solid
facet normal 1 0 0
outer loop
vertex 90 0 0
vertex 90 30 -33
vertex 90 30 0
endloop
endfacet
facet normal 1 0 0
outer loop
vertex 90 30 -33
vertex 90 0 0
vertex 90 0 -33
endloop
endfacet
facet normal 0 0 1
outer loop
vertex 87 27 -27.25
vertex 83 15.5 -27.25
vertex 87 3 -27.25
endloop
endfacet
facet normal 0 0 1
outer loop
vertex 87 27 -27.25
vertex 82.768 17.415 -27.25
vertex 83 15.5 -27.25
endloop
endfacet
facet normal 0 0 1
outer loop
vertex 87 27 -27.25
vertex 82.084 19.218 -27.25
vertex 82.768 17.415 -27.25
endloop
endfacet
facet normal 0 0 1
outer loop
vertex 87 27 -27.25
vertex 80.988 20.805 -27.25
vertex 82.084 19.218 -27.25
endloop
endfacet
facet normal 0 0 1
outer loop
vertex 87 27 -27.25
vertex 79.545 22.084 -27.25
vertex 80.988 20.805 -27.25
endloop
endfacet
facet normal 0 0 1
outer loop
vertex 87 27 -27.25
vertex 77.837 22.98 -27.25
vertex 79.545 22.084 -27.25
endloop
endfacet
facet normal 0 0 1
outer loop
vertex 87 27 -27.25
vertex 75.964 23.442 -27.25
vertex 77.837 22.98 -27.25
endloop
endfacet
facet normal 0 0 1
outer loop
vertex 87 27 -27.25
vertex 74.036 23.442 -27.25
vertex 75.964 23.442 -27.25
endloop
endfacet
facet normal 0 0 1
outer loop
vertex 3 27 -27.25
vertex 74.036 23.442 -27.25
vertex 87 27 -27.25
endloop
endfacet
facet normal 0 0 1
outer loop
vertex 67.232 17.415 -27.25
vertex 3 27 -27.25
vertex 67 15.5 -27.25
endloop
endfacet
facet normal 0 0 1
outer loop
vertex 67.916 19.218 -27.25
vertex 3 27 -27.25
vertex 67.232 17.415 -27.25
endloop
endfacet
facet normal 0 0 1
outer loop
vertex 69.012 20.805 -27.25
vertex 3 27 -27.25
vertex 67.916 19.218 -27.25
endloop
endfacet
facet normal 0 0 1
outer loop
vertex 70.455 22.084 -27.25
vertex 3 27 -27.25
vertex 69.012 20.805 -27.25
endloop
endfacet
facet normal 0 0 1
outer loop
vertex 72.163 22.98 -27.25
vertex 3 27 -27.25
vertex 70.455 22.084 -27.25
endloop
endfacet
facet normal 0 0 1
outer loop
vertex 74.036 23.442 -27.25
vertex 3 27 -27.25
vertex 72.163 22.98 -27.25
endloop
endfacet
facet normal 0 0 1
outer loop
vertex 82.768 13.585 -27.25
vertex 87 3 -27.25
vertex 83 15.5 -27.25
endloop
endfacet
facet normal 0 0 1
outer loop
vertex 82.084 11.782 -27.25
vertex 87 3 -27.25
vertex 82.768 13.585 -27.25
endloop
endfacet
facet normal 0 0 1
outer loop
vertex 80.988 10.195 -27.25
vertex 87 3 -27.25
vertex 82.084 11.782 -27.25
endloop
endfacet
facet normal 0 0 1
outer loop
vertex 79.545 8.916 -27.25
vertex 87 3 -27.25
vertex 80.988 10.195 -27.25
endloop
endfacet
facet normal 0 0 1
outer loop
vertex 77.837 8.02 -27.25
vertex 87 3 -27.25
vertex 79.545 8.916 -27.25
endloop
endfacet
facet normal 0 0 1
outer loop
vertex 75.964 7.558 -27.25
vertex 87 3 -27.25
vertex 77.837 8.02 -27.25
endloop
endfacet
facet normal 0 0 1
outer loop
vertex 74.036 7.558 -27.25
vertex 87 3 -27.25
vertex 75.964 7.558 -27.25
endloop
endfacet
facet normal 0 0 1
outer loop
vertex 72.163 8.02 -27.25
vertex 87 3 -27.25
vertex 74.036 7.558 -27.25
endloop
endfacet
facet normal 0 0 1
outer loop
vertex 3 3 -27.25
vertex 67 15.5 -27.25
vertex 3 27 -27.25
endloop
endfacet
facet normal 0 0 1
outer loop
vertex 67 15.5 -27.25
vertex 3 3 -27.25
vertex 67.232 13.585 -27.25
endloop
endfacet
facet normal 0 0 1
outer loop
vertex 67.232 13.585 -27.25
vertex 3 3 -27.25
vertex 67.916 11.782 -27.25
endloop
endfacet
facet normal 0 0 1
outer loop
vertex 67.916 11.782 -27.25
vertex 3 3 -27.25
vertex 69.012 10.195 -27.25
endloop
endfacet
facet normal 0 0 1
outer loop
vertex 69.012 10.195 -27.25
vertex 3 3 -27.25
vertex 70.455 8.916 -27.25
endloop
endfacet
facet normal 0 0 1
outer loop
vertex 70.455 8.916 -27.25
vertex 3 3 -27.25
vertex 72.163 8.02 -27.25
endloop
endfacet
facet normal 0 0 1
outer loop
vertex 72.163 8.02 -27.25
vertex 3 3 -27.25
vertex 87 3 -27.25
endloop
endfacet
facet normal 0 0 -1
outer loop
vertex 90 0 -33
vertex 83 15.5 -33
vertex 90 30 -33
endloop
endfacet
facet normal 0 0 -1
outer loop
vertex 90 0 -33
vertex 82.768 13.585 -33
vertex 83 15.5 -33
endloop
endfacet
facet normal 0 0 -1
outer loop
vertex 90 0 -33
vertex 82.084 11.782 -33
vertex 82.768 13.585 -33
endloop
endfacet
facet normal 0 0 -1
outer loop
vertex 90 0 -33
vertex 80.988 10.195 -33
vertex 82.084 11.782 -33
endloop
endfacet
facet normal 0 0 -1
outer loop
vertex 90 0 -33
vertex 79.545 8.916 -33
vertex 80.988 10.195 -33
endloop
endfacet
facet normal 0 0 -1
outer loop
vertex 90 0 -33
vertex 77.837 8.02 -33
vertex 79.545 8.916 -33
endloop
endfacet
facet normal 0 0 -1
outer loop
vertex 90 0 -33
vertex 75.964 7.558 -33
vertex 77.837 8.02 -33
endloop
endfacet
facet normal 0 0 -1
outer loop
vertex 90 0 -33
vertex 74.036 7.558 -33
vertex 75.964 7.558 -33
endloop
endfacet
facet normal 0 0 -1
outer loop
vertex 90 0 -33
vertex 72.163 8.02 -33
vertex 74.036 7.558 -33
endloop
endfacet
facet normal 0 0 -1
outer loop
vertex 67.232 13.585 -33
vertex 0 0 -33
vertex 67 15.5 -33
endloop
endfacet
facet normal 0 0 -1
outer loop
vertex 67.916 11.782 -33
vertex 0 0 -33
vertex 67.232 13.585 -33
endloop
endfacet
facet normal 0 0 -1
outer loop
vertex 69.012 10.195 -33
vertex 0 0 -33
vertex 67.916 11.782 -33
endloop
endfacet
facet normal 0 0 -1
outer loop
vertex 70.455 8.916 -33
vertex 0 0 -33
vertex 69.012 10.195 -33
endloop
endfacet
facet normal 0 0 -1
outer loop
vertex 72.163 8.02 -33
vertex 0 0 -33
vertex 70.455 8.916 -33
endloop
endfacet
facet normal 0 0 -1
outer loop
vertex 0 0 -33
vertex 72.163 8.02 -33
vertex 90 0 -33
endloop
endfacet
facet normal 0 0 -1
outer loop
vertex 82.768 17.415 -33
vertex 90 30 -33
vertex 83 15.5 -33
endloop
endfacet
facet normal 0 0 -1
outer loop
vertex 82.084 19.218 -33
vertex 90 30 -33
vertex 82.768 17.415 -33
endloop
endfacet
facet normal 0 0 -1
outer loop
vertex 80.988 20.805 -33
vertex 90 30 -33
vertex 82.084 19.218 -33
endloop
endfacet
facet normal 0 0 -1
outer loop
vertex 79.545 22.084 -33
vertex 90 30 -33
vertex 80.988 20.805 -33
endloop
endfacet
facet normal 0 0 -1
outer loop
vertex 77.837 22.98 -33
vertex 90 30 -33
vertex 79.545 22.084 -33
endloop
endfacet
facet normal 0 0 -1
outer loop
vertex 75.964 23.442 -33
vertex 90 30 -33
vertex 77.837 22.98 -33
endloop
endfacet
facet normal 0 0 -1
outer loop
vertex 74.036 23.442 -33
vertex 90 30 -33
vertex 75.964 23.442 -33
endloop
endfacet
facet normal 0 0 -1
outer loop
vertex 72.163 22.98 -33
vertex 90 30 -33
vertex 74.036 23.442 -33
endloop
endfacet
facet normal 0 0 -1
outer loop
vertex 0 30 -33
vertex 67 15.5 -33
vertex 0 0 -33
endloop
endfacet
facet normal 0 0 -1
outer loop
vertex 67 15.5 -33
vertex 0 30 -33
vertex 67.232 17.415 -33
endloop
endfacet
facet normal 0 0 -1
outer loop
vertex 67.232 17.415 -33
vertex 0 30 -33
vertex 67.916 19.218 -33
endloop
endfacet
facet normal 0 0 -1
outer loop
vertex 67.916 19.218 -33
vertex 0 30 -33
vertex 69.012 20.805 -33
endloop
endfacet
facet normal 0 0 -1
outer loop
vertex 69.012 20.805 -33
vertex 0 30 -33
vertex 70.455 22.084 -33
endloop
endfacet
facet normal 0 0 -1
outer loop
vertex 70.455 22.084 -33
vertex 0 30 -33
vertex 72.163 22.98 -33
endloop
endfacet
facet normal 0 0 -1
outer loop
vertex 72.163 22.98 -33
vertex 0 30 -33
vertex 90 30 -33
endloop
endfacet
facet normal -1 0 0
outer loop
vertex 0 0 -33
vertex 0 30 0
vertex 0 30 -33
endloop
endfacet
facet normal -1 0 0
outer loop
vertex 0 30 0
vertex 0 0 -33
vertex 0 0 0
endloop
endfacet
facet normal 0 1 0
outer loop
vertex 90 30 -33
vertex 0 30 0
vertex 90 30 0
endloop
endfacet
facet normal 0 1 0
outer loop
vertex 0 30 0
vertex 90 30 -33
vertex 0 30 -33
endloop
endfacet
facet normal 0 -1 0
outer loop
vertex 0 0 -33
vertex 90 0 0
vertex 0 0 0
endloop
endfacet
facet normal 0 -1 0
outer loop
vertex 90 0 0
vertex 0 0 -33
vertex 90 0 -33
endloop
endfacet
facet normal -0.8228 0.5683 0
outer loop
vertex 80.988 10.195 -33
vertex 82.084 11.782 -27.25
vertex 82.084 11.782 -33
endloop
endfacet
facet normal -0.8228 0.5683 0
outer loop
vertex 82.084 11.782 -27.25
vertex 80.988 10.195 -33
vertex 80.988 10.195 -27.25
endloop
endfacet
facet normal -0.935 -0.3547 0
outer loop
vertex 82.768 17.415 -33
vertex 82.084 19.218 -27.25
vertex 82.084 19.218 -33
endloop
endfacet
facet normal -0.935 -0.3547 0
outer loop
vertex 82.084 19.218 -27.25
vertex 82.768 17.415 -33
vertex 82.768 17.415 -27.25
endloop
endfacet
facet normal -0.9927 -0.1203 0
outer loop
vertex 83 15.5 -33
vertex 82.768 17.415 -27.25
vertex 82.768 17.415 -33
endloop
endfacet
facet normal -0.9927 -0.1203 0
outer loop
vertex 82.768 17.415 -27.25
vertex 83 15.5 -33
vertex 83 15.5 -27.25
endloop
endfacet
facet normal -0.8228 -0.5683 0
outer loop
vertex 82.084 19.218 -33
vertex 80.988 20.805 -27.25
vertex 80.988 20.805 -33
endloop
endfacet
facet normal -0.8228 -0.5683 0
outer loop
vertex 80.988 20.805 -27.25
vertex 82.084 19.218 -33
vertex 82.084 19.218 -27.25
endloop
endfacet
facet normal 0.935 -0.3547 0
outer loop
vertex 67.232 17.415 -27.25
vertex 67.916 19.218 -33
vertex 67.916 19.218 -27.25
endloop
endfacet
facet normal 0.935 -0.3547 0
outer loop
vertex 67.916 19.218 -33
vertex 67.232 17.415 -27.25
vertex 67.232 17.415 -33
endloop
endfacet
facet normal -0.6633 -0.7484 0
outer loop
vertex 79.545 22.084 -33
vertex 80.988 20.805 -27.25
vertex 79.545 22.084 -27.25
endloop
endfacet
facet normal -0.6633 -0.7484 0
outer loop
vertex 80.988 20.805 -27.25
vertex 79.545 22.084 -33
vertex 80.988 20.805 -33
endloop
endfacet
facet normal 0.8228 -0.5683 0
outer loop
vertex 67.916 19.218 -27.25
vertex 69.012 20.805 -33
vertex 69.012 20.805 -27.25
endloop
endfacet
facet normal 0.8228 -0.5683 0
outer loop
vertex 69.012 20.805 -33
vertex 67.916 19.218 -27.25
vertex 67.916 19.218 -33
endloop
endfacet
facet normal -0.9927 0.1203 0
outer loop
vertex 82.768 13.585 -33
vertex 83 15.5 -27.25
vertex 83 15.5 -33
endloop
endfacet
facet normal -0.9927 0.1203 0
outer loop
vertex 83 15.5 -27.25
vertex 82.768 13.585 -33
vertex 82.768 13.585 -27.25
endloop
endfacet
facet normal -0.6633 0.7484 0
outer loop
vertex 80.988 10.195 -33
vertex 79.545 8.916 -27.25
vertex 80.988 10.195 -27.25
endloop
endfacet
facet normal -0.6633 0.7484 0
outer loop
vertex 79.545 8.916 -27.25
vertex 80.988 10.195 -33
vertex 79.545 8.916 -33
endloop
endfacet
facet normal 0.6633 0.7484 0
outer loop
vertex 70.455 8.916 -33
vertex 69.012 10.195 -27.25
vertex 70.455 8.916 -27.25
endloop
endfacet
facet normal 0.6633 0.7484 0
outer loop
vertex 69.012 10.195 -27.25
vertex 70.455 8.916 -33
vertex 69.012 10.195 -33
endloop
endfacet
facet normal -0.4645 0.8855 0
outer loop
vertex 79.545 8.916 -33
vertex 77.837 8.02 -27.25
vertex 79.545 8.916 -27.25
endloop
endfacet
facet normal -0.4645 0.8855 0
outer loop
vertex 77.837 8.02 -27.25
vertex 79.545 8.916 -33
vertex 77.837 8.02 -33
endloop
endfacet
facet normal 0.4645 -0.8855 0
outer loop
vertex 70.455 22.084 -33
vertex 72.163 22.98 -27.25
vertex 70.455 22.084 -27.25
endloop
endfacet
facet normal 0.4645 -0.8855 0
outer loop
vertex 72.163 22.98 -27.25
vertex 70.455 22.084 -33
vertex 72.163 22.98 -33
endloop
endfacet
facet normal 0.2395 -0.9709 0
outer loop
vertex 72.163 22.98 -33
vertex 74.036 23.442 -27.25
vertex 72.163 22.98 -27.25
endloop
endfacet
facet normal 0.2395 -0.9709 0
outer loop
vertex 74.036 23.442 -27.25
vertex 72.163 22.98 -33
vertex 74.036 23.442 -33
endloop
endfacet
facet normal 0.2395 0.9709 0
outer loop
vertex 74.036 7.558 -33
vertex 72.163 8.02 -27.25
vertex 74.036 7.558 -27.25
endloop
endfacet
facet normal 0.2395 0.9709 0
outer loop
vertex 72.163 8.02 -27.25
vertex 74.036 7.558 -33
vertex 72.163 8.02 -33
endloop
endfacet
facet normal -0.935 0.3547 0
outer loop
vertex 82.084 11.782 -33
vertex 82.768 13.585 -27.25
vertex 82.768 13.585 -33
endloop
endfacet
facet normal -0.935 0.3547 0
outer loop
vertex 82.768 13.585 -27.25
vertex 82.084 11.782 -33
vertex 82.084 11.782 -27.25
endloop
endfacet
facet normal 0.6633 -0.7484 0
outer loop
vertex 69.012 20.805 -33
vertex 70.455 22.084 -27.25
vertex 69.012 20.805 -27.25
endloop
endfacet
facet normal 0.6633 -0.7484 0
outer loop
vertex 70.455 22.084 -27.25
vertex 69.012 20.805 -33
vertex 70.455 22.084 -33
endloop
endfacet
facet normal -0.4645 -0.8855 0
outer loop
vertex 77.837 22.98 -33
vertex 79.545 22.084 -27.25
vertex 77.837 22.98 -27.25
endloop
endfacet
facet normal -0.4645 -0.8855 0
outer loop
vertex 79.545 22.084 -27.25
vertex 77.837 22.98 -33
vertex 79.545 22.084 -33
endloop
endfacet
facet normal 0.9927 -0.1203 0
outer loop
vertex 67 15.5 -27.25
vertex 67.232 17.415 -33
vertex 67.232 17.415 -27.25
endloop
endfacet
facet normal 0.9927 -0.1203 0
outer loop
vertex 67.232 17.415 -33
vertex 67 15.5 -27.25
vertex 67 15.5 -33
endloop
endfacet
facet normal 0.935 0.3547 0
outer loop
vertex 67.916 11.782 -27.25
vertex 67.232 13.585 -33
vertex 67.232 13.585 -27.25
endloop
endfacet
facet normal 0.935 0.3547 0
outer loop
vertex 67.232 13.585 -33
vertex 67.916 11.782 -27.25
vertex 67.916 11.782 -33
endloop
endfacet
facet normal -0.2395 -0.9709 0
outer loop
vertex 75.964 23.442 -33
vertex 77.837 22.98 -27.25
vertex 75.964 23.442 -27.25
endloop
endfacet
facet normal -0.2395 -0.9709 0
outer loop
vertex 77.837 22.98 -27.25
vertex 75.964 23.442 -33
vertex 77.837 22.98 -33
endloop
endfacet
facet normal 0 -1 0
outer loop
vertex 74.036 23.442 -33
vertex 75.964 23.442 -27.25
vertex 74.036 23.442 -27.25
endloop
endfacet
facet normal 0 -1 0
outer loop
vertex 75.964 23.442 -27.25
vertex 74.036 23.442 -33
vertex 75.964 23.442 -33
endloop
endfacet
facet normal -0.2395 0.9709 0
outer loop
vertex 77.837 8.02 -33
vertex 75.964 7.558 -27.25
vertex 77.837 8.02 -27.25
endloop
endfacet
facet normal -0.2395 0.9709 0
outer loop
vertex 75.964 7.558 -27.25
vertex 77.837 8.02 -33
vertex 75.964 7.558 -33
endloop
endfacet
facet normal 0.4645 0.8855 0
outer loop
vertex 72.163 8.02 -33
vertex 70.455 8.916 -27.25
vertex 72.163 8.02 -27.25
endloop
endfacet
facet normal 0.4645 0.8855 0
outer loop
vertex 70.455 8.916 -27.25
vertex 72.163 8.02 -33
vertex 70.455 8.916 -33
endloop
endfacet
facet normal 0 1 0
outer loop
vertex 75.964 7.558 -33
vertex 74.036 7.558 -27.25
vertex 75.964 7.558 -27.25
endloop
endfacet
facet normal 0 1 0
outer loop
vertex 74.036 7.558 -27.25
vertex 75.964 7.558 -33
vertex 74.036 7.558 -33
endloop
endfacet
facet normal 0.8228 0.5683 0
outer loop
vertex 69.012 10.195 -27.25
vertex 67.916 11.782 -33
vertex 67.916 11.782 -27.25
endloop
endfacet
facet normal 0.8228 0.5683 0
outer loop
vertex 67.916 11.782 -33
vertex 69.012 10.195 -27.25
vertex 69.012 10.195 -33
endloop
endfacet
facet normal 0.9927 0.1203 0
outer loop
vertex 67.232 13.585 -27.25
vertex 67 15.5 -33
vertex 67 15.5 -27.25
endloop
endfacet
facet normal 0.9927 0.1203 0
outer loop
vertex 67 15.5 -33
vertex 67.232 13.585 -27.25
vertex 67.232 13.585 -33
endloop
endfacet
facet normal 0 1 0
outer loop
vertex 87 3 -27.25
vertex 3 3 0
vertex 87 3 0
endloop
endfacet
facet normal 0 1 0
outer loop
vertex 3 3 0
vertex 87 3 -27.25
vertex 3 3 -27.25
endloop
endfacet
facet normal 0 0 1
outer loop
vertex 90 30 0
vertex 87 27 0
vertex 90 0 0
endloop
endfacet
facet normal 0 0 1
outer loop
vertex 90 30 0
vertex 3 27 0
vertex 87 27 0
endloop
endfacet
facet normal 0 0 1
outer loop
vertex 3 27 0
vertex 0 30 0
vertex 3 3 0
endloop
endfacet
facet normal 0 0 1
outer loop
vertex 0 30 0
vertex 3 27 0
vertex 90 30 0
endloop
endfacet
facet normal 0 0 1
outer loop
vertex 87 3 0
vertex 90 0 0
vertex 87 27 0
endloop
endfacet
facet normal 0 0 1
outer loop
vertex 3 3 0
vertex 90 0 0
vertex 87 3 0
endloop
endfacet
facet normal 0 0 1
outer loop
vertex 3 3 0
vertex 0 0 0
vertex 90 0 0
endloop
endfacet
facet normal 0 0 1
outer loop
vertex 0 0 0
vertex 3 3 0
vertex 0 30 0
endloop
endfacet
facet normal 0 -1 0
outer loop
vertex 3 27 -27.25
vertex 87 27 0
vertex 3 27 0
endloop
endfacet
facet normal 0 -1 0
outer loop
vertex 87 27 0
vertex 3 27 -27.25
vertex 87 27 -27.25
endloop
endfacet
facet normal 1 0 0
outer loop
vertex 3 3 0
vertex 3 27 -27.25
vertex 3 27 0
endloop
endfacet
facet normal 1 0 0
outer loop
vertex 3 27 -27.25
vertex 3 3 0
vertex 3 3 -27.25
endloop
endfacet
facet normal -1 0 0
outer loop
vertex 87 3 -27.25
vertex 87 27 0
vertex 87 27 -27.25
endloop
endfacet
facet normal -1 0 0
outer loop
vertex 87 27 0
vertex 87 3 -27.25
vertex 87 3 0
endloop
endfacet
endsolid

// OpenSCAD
BODY_DEPTH = 3;
SWITCH_DEPTH = 4.25;
PLATE_DEPTH = 1.5;
FRONT_DEPTH = SWITCH_DEPTH + PLATE_DEPTH;
SWITCH_POSITION = [2.5, 5.5, 0];
ENCODER_POSITION = [75, 15.5, 0];
ENCODER_BODY_SIZE = 12;

// Top
rotate([270, 0, 0])
    cube(size = [90, 30, BODY_DEPTH]);
    
// Bottom
rotate([270, 0, 0])
    translate([0, 0, 30 - BODY_DEPTH])
    cube(size = [90, 30, BODY_DEPTH]);
    
// Sides
rotate([0, 90, 0])
    cube(size = [30, 30, BODY_DEPTH]);
    
rotate([0, 90, 0])
    translate([0, 0, 90 - BODY_DEPTH])
    cube(size = [30, 30, BODY_DEPTH]);

// Back
translate([0, 0, -30 - BODY_DEPTH])
    difference() {
        cube(size = [90, 30, FRONT_DEPTH]);
        translate(ENCODER_POSITION)
            cylinder(10, 8, 8);
    }
